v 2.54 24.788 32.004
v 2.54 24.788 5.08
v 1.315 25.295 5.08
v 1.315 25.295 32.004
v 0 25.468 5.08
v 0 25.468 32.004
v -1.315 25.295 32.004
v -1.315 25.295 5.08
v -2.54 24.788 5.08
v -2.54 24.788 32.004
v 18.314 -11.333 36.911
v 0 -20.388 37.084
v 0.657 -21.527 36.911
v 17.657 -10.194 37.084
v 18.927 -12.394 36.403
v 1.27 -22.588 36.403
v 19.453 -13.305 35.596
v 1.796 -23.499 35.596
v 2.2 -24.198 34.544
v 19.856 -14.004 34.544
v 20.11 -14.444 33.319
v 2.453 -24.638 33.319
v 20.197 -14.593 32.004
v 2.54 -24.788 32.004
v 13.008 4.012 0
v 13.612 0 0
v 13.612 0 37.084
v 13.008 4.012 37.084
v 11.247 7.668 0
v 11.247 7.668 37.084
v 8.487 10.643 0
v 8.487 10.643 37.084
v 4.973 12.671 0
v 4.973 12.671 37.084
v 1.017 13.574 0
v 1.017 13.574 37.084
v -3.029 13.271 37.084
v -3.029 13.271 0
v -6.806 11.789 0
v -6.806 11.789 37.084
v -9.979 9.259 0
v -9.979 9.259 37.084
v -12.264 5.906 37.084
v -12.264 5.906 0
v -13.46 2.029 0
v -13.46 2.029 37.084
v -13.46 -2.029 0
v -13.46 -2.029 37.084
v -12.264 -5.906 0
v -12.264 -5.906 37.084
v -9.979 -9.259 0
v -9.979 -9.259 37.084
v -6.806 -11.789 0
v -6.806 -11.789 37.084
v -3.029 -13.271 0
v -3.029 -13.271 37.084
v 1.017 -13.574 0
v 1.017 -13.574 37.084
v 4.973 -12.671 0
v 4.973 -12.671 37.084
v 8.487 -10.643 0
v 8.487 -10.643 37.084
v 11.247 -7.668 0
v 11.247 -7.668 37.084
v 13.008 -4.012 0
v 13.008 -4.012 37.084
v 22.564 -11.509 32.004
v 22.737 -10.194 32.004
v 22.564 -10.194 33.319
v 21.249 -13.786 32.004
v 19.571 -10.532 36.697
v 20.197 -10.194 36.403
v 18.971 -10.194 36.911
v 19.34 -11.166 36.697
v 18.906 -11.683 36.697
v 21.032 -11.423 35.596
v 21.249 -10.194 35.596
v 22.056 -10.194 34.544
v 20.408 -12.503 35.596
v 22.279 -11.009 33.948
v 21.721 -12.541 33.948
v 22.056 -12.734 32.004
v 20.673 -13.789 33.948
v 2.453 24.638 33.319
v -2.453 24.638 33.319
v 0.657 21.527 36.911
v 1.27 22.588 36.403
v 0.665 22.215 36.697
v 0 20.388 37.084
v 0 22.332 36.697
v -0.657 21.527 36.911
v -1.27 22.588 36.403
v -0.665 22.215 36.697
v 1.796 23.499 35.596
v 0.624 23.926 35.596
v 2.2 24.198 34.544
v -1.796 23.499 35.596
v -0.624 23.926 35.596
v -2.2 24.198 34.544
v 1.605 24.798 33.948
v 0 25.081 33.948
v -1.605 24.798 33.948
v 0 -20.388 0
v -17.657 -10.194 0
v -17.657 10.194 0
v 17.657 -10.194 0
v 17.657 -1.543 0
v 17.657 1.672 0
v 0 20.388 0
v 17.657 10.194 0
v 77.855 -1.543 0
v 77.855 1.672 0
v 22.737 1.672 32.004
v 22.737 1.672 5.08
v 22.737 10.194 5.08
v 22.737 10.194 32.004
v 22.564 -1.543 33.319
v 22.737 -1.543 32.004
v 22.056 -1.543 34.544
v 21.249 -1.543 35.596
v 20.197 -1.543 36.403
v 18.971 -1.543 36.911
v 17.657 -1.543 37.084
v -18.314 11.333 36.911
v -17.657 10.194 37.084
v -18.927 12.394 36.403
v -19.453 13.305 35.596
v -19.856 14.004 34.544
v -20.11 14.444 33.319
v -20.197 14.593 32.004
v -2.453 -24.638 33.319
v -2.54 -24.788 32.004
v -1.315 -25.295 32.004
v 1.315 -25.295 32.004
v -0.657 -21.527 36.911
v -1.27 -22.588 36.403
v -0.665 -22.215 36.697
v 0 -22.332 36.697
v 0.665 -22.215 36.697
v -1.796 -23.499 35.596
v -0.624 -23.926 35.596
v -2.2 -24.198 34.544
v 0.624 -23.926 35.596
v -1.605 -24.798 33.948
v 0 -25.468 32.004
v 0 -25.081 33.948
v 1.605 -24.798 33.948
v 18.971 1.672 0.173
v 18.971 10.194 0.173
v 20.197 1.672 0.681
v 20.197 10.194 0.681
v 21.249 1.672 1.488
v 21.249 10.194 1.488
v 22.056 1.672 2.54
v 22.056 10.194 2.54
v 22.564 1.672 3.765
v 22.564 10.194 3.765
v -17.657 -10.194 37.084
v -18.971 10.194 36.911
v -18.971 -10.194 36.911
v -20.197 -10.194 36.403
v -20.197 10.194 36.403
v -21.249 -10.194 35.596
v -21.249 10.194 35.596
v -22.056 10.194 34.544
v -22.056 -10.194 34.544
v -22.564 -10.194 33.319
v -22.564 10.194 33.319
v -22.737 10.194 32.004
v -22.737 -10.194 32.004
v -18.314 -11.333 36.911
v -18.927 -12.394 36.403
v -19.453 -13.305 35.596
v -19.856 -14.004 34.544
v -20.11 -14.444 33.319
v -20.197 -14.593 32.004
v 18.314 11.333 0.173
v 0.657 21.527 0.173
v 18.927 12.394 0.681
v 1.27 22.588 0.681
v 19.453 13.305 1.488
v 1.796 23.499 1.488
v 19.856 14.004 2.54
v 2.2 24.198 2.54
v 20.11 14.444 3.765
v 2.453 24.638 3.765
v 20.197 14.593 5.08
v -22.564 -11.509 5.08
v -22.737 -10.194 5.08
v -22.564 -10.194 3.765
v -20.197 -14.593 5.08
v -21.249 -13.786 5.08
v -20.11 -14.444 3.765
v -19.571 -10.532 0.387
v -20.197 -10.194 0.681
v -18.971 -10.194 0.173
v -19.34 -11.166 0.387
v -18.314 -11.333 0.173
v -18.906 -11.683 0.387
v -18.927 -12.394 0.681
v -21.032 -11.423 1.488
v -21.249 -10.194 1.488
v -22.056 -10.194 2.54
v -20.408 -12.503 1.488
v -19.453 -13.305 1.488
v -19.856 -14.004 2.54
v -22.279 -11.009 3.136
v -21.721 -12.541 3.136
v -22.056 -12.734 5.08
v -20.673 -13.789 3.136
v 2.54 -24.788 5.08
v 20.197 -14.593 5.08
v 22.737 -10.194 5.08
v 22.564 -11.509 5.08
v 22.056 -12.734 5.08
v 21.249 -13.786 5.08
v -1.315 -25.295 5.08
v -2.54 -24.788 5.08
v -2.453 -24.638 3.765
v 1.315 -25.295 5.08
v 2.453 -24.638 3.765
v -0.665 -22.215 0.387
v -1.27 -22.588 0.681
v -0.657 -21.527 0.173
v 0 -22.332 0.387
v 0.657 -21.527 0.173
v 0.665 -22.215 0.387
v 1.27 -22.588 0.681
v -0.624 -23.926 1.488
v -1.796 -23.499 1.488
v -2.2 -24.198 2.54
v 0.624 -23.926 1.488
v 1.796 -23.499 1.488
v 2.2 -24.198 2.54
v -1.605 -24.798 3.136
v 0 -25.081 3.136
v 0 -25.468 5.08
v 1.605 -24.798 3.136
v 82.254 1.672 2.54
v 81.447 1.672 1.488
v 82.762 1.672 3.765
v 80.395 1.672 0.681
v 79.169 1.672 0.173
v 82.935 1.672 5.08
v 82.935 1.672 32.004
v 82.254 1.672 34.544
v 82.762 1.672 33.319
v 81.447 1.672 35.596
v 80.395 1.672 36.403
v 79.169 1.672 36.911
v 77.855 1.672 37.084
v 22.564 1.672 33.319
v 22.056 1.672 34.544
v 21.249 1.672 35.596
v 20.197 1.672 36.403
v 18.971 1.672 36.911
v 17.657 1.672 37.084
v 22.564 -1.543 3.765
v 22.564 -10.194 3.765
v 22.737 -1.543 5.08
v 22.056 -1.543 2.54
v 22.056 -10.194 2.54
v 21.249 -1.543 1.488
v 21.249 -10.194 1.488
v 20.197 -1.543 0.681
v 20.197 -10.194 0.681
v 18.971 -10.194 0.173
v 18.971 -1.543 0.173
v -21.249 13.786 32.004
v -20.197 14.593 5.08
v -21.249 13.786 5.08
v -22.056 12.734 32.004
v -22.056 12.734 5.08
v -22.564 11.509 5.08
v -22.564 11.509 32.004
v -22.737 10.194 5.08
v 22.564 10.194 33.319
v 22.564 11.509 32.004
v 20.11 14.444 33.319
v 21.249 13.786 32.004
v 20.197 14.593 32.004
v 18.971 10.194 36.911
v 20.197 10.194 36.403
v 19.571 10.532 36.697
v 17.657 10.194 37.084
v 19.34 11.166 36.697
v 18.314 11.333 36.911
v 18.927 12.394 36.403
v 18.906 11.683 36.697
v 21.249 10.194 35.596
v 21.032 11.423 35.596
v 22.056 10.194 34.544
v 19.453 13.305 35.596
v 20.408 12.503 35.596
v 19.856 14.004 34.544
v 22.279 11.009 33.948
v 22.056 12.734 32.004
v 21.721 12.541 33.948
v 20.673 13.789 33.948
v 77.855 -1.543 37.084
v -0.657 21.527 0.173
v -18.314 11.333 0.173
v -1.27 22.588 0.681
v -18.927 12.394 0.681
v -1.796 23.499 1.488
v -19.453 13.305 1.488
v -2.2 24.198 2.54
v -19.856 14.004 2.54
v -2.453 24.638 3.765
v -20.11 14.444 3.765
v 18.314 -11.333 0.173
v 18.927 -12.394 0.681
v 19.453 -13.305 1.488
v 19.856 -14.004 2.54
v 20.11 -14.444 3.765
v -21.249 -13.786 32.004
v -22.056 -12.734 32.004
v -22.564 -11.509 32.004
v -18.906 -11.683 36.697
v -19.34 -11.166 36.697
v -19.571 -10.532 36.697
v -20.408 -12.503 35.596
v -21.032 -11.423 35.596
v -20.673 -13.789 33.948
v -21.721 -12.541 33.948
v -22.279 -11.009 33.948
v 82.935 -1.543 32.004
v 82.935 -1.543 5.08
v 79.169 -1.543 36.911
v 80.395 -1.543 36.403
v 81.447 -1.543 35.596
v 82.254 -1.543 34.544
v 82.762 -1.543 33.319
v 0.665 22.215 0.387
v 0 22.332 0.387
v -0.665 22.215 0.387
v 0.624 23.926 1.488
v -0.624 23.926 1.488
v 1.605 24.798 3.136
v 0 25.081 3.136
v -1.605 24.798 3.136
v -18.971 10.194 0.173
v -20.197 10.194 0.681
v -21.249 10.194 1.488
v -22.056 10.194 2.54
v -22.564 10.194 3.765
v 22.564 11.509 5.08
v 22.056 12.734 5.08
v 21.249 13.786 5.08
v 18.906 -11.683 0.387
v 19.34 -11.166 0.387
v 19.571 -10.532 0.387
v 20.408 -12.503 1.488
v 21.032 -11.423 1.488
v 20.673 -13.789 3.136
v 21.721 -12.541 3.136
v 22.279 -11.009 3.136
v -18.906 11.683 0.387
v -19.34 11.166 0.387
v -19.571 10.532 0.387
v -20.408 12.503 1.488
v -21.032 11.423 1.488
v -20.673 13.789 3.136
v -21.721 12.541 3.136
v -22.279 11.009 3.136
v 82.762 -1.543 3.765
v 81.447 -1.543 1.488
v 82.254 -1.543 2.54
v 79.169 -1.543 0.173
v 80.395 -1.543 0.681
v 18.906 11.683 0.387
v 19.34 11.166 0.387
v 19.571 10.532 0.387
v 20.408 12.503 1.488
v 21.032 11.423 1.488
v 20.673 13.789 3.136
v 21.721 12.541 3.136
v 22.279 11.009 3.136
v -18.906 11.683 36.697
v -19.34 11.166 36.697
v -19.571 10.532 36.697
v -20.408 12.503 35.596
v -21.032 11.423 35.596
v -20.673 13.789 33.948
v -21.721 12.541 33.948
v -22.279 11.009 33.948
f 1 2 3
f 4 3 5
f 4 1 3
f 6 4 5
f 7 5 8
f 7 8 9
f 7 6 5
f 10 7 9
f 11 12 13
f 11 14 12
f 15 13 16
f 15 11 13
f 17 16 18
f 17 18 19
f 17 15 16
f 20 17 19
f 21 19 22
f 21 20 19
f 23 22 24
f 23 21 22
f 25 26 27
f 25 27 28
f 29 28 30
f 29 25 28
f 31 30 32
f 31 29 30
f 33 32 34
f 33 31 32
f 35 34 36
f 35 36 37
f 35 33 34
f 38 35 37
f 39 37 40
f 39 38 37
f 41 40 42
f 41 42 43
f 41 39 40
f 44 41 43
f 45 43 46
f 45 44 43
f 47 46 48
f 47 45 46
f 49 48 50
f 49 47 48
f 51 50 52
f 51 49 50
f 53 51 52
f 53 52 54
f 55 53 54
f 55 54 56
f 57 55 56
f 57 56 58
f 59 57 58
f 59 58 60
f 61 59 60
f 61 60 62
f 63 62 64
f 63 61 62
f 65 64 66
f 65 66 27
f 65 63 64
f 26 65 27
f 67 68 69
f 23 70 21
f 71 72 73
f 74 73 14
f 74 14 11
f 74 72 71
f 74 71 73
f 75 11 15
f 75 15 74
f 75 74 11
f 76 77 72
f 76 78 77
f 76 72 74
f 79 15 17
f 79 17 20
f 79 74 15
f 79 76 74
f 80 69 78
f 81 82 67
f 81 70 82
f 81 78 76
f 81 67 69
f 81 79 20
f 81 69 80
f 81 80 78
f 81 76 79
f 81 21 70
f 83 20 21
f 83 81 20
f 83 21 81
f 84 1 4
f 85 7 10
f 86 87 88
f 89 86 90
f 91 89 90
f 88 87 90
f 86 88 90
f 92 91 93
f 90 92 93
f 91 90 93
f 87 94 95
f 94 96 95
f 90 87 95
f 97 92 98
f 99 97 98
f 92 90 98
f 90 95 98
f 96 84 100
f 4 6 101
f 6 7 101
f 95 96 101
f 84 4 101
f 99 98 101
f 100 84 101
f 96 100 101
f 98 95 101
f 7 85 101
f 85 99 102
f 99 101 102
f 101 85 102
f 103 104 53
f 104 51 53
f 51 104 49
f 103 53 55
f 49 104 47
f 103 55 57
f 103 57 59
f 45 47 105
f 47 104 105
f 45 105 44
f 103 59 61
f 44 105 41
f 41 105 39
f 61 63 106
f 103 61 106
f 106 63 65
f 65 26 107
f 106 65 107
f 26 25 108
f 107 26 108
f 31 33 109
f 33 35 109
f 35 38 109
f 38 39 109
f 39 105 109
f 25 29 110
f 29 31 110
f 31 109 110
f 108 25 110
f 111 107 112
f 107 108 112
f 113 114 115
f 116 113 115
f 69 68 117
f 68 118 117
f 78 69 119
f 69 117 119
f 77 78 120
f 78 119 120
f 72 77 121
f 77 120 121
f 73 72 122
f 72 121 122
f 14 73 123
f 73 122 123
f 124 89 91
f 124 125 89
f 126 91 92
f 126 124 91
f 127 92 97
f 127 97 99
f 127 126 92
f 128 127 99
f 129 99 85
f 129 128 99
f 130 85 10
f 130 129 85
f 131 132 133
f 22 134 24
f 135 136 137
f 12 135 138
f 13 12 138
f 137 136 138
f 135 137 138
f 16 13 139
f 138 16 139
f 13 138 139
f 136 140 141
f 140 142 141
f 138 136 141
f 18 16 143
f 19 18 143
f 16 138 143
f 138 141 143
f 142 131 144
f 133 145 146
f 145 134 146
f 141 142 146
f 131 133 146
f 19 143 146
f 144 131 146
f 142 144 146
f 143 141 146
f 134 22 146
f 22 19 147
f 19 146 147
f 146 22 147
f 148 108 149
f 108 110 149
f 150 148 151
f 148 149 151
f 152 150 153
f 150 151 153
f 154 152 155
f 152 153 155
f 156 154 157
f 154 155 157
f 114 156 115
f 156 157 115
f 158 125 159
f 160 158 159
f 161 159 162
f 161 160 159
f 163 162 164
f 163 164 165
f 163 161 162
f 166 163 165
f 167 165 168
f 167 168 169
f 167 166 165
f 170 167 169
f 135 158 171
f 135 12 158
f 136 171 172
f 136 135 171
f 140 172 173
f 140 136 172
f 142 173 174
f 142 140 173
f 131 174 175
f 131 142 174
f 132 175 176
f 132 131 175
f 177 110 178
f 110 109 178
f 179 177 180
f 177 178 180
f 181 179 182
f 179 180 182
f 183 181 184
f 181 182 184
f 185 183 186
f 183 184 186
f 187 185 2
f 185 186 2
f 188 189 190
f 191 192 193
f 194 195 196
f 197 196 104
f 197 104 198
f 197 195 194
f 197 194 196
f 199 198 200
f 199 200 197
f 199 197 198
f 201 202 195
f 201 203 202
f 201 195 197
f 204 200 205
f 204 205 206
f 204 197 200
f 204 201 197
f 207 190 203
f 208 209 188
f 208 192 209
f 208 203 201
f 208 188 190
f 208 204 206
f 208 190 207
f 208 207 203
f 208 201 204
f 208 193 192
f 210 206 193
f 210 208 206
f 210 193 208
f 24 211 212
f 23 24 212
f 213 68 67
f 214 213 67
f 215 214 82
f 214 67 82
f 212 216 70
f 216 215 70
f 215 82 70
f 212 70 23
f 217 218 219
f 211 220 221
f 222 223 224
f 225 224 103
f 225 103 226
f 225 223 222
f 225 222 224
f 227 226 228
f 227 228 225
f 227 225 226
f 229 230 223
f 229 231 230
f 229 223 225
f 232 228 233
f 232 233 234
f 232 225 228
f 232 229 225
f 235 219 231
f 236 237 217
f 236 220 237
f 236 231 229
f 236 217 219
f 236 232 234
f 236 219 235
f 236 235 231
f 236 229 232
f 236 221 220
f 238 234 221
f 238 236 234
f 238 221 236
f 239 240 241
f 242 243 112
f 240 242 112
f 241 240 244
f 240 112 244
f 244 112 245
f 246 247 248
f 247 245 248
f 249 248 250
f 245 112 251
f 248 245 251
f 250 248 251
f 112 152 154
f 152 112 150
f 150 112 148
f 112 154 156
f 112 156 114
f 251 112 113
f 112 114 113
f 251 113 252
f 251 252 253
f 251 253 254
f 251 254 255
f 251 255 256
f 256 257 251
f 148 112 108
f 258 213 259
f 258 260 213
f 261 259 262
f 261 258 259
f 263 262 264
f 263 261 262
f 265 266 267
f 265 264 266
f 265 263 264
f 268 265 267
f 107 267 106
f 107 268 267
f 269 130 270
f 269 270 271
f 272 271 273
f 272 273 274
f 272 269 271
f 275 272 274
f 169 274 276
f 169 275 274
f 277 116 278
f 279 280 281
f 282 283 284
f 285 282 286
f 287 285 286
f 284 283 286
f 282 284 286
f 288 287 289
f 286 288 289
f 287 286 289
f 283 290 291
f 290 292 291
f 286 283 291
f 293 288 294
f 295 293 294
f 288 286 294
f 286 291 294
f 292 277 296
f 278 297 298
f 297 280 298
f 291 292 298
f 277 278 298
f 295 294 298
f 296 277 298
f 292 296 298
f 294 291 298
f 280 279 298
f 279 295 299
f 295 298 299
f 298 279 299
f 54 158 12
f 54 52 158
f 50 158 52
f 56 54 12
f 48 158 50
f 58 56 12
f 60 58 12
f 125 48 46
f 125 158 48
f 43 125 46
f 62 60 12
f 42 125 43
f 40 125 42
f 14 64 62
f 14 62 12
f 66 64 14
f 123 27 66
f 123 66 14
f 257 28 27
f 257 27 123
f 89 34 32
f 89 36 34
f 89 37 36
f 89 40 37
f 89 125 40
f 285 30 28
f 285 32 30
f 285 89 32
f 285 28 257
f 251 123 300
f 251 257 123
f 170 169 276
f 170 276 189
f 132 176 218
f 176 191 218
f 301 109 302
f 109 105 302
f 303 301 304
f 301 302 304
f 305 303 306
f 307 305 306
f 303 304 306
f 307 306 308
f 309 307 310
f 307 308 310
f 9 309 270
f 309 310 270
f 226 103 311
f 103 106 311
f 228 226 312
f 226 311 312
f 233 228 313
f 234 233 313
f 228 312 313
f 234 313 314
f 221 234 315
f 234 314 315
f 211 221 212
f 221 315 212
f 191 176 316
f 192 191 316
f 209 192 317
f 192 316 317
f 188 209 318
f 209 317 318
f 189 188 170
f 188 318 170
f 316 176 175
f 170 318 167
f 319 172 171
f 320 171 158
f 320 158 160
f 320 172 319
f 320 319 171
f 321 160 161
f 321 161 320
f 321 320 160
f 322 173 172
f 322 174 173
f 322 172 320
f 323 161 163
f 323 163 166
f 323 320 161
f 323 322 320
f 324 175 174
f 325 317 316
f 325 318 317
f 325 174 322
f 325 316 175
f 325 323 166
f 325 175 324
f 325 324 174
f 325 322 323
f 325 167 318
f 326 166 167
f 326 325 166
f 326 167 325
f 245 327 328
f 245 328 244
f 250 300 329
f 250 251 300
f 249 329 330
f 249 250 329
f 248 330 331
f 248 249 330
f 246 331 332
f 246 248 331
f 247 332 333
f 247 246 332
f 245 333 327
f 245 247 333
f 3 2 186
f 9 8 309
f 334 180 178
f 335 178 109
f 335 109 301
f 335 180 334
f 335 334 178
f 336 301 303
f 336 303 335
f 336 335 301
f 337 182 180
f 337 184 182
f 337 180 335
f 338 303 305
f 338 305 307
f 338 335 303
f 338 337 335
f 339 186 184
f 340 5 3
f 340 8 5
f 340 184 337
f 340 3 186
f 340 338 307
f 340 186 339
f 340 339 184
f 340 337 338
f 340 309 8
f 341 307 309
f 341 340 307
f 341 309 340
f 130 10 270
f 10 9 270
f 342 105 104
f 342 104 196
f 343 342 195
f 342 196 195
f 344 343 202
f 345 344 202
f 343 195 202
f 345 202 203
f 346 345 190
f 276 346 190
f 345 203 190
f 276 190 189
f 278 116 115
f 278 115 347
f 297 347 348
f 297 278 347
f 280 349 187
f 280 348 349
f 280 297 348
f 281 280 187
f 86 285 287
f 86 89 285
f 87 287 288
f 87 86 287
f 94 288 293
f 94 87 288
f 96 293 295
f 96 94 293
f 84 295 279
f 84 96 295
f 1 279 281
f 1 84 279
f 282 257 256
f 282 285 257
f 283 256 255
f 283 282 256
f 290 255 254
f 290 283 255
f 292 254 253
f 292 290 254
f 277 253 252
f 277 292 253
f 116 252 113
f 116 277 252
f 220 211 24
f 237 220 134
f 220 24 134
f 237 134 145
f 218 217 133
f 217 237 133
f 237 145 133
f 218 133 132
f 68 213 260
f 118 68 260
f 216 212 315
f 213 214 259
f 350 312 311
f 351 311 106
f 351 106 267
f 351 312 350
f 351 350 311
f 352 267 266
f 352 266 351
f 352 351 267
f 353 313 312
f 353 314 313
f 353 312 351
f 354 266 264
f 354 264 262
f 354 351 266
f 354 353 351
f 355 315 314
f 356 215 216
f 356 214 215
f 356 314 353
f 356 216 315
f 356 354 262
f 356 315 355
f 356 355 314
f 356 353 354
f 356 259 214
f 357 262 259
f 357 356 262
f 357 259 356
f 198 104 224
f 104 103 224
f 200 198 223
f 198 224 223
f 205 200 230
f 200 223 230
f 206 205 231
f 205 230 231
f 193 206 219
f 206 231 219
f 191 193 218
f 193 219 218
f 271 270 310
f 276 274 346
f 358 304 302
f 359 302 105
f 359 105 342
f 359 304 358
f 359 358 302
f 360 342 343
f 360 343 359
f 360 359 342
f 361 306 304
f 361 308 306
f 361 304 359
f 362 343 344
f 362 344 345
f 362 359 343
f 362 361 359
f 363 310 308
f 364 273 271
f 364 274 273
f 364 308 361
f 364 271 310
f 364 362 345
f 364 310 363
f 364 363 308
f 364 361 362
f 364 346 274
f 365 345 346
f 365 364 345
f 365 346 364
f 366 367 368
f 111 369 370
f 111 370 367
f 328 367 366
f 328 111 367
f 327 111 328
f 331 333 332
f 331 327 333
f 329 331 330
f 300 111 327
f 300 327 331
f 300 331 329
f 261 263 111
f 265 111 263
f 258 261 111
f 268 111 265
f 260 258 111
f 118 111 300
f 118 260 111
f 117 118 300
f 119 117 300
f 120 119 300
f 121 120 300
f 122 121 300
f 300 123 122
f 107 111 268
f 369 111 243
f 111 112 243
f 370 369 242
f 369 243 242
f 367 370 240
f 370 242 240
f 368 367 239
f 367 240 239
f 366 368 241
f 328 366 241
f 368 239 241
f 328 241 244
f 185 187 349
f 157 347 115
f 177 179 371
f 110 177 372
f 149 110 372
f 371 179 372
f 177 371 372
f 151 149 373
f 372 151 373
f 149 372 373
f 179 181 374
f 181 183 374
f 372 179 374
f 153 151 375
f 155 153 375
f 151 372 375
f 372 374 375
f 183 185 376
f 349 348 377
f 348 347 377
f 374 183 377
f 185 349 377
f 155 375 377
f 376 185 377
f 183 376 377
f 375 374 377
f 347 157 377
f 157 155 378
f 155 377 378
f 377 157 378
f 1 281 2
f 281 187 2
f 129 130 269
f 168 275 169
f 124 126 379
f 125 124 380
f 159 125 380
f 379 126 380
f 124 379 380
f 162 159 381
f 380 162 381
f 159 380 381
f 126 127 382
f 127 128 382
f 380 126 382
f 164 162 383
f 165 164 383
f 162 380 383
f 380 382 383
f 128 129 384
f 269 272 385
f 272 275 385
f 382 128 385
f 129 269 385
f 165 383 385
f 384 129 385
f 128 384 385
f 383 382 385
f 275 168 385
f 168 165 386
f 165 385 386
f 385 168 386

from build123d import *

# Parameters (mm, degrees)
F0_R     = 13.612329
F1_DEPTH = 37.084
F2_W     = 3.215712
F2_H     = 37.084
F3_DEPTH = 60.198
F4_R     = 5.08


with BuildPart() as f1:
    # F0 (on Top) → F1 (new body)
    with BuildSketch(Plane.XY):
        Polygon((22.736654, -13.127013), (22.736654, 13.127013), (0, 26.254026), (-22.736654, 13.127013), (-22.736654, -13.127013), (0, -26.254026), align=None)
        Circle(F0_R, mode=Mode.SUBTRACT)
    extrude(amount=F1_DEPTH)

    # F2 (on face) → F3 (join)
    with BuildSketch(Plane.YZ.offset(22.736654)):
        with Locations((0.064627, 18.542)):
            Rectangle(F2_W, F2_H)
    extrude(amount=F3_DEPTH)

    # F4
    f4_edges = [f1.edges().sort_by_distance(p)[0] for p in [
        (-11.368327, -19.69052, 37.084),
        (22.736654, -7.335121, 37.084),
        (22.736654, 7.399748, 37.084),
        (11.368327, 19.69052, 37.084),
        (-11.368327, 19.69052, 37.084),
        (-22.736654, 0, 37.084),
        (11.368327, 19.69052, 0),
        (-11.368327, 19.69052, 0),
        (-22.736654, 0, 0),
        (-11.368327, -19.69052, 0),
        (11.368327, -19.69052, 0),
        (22.736654, -7.335121, 0),
        (22.736654, 7.399748, 0),
        (82.934654, 0.064627, 0),
        (82.934654, 0.064627, 37.084),
        (11.368327, -19.69052, 37.084),
        (-22.736654, 13.127013, 18.542),
        (22.736654, 13.127013, 18.542),
        (0, 26.254026, 18.542),
        (-22.736654, -13.127013, 18.542),
        (0, -26.254026, 18.542),
        (22.736654, -13.127013, 18.542),
    ]]
    fillet(f4_edges, radius=F4_R)


solid = f1.part
